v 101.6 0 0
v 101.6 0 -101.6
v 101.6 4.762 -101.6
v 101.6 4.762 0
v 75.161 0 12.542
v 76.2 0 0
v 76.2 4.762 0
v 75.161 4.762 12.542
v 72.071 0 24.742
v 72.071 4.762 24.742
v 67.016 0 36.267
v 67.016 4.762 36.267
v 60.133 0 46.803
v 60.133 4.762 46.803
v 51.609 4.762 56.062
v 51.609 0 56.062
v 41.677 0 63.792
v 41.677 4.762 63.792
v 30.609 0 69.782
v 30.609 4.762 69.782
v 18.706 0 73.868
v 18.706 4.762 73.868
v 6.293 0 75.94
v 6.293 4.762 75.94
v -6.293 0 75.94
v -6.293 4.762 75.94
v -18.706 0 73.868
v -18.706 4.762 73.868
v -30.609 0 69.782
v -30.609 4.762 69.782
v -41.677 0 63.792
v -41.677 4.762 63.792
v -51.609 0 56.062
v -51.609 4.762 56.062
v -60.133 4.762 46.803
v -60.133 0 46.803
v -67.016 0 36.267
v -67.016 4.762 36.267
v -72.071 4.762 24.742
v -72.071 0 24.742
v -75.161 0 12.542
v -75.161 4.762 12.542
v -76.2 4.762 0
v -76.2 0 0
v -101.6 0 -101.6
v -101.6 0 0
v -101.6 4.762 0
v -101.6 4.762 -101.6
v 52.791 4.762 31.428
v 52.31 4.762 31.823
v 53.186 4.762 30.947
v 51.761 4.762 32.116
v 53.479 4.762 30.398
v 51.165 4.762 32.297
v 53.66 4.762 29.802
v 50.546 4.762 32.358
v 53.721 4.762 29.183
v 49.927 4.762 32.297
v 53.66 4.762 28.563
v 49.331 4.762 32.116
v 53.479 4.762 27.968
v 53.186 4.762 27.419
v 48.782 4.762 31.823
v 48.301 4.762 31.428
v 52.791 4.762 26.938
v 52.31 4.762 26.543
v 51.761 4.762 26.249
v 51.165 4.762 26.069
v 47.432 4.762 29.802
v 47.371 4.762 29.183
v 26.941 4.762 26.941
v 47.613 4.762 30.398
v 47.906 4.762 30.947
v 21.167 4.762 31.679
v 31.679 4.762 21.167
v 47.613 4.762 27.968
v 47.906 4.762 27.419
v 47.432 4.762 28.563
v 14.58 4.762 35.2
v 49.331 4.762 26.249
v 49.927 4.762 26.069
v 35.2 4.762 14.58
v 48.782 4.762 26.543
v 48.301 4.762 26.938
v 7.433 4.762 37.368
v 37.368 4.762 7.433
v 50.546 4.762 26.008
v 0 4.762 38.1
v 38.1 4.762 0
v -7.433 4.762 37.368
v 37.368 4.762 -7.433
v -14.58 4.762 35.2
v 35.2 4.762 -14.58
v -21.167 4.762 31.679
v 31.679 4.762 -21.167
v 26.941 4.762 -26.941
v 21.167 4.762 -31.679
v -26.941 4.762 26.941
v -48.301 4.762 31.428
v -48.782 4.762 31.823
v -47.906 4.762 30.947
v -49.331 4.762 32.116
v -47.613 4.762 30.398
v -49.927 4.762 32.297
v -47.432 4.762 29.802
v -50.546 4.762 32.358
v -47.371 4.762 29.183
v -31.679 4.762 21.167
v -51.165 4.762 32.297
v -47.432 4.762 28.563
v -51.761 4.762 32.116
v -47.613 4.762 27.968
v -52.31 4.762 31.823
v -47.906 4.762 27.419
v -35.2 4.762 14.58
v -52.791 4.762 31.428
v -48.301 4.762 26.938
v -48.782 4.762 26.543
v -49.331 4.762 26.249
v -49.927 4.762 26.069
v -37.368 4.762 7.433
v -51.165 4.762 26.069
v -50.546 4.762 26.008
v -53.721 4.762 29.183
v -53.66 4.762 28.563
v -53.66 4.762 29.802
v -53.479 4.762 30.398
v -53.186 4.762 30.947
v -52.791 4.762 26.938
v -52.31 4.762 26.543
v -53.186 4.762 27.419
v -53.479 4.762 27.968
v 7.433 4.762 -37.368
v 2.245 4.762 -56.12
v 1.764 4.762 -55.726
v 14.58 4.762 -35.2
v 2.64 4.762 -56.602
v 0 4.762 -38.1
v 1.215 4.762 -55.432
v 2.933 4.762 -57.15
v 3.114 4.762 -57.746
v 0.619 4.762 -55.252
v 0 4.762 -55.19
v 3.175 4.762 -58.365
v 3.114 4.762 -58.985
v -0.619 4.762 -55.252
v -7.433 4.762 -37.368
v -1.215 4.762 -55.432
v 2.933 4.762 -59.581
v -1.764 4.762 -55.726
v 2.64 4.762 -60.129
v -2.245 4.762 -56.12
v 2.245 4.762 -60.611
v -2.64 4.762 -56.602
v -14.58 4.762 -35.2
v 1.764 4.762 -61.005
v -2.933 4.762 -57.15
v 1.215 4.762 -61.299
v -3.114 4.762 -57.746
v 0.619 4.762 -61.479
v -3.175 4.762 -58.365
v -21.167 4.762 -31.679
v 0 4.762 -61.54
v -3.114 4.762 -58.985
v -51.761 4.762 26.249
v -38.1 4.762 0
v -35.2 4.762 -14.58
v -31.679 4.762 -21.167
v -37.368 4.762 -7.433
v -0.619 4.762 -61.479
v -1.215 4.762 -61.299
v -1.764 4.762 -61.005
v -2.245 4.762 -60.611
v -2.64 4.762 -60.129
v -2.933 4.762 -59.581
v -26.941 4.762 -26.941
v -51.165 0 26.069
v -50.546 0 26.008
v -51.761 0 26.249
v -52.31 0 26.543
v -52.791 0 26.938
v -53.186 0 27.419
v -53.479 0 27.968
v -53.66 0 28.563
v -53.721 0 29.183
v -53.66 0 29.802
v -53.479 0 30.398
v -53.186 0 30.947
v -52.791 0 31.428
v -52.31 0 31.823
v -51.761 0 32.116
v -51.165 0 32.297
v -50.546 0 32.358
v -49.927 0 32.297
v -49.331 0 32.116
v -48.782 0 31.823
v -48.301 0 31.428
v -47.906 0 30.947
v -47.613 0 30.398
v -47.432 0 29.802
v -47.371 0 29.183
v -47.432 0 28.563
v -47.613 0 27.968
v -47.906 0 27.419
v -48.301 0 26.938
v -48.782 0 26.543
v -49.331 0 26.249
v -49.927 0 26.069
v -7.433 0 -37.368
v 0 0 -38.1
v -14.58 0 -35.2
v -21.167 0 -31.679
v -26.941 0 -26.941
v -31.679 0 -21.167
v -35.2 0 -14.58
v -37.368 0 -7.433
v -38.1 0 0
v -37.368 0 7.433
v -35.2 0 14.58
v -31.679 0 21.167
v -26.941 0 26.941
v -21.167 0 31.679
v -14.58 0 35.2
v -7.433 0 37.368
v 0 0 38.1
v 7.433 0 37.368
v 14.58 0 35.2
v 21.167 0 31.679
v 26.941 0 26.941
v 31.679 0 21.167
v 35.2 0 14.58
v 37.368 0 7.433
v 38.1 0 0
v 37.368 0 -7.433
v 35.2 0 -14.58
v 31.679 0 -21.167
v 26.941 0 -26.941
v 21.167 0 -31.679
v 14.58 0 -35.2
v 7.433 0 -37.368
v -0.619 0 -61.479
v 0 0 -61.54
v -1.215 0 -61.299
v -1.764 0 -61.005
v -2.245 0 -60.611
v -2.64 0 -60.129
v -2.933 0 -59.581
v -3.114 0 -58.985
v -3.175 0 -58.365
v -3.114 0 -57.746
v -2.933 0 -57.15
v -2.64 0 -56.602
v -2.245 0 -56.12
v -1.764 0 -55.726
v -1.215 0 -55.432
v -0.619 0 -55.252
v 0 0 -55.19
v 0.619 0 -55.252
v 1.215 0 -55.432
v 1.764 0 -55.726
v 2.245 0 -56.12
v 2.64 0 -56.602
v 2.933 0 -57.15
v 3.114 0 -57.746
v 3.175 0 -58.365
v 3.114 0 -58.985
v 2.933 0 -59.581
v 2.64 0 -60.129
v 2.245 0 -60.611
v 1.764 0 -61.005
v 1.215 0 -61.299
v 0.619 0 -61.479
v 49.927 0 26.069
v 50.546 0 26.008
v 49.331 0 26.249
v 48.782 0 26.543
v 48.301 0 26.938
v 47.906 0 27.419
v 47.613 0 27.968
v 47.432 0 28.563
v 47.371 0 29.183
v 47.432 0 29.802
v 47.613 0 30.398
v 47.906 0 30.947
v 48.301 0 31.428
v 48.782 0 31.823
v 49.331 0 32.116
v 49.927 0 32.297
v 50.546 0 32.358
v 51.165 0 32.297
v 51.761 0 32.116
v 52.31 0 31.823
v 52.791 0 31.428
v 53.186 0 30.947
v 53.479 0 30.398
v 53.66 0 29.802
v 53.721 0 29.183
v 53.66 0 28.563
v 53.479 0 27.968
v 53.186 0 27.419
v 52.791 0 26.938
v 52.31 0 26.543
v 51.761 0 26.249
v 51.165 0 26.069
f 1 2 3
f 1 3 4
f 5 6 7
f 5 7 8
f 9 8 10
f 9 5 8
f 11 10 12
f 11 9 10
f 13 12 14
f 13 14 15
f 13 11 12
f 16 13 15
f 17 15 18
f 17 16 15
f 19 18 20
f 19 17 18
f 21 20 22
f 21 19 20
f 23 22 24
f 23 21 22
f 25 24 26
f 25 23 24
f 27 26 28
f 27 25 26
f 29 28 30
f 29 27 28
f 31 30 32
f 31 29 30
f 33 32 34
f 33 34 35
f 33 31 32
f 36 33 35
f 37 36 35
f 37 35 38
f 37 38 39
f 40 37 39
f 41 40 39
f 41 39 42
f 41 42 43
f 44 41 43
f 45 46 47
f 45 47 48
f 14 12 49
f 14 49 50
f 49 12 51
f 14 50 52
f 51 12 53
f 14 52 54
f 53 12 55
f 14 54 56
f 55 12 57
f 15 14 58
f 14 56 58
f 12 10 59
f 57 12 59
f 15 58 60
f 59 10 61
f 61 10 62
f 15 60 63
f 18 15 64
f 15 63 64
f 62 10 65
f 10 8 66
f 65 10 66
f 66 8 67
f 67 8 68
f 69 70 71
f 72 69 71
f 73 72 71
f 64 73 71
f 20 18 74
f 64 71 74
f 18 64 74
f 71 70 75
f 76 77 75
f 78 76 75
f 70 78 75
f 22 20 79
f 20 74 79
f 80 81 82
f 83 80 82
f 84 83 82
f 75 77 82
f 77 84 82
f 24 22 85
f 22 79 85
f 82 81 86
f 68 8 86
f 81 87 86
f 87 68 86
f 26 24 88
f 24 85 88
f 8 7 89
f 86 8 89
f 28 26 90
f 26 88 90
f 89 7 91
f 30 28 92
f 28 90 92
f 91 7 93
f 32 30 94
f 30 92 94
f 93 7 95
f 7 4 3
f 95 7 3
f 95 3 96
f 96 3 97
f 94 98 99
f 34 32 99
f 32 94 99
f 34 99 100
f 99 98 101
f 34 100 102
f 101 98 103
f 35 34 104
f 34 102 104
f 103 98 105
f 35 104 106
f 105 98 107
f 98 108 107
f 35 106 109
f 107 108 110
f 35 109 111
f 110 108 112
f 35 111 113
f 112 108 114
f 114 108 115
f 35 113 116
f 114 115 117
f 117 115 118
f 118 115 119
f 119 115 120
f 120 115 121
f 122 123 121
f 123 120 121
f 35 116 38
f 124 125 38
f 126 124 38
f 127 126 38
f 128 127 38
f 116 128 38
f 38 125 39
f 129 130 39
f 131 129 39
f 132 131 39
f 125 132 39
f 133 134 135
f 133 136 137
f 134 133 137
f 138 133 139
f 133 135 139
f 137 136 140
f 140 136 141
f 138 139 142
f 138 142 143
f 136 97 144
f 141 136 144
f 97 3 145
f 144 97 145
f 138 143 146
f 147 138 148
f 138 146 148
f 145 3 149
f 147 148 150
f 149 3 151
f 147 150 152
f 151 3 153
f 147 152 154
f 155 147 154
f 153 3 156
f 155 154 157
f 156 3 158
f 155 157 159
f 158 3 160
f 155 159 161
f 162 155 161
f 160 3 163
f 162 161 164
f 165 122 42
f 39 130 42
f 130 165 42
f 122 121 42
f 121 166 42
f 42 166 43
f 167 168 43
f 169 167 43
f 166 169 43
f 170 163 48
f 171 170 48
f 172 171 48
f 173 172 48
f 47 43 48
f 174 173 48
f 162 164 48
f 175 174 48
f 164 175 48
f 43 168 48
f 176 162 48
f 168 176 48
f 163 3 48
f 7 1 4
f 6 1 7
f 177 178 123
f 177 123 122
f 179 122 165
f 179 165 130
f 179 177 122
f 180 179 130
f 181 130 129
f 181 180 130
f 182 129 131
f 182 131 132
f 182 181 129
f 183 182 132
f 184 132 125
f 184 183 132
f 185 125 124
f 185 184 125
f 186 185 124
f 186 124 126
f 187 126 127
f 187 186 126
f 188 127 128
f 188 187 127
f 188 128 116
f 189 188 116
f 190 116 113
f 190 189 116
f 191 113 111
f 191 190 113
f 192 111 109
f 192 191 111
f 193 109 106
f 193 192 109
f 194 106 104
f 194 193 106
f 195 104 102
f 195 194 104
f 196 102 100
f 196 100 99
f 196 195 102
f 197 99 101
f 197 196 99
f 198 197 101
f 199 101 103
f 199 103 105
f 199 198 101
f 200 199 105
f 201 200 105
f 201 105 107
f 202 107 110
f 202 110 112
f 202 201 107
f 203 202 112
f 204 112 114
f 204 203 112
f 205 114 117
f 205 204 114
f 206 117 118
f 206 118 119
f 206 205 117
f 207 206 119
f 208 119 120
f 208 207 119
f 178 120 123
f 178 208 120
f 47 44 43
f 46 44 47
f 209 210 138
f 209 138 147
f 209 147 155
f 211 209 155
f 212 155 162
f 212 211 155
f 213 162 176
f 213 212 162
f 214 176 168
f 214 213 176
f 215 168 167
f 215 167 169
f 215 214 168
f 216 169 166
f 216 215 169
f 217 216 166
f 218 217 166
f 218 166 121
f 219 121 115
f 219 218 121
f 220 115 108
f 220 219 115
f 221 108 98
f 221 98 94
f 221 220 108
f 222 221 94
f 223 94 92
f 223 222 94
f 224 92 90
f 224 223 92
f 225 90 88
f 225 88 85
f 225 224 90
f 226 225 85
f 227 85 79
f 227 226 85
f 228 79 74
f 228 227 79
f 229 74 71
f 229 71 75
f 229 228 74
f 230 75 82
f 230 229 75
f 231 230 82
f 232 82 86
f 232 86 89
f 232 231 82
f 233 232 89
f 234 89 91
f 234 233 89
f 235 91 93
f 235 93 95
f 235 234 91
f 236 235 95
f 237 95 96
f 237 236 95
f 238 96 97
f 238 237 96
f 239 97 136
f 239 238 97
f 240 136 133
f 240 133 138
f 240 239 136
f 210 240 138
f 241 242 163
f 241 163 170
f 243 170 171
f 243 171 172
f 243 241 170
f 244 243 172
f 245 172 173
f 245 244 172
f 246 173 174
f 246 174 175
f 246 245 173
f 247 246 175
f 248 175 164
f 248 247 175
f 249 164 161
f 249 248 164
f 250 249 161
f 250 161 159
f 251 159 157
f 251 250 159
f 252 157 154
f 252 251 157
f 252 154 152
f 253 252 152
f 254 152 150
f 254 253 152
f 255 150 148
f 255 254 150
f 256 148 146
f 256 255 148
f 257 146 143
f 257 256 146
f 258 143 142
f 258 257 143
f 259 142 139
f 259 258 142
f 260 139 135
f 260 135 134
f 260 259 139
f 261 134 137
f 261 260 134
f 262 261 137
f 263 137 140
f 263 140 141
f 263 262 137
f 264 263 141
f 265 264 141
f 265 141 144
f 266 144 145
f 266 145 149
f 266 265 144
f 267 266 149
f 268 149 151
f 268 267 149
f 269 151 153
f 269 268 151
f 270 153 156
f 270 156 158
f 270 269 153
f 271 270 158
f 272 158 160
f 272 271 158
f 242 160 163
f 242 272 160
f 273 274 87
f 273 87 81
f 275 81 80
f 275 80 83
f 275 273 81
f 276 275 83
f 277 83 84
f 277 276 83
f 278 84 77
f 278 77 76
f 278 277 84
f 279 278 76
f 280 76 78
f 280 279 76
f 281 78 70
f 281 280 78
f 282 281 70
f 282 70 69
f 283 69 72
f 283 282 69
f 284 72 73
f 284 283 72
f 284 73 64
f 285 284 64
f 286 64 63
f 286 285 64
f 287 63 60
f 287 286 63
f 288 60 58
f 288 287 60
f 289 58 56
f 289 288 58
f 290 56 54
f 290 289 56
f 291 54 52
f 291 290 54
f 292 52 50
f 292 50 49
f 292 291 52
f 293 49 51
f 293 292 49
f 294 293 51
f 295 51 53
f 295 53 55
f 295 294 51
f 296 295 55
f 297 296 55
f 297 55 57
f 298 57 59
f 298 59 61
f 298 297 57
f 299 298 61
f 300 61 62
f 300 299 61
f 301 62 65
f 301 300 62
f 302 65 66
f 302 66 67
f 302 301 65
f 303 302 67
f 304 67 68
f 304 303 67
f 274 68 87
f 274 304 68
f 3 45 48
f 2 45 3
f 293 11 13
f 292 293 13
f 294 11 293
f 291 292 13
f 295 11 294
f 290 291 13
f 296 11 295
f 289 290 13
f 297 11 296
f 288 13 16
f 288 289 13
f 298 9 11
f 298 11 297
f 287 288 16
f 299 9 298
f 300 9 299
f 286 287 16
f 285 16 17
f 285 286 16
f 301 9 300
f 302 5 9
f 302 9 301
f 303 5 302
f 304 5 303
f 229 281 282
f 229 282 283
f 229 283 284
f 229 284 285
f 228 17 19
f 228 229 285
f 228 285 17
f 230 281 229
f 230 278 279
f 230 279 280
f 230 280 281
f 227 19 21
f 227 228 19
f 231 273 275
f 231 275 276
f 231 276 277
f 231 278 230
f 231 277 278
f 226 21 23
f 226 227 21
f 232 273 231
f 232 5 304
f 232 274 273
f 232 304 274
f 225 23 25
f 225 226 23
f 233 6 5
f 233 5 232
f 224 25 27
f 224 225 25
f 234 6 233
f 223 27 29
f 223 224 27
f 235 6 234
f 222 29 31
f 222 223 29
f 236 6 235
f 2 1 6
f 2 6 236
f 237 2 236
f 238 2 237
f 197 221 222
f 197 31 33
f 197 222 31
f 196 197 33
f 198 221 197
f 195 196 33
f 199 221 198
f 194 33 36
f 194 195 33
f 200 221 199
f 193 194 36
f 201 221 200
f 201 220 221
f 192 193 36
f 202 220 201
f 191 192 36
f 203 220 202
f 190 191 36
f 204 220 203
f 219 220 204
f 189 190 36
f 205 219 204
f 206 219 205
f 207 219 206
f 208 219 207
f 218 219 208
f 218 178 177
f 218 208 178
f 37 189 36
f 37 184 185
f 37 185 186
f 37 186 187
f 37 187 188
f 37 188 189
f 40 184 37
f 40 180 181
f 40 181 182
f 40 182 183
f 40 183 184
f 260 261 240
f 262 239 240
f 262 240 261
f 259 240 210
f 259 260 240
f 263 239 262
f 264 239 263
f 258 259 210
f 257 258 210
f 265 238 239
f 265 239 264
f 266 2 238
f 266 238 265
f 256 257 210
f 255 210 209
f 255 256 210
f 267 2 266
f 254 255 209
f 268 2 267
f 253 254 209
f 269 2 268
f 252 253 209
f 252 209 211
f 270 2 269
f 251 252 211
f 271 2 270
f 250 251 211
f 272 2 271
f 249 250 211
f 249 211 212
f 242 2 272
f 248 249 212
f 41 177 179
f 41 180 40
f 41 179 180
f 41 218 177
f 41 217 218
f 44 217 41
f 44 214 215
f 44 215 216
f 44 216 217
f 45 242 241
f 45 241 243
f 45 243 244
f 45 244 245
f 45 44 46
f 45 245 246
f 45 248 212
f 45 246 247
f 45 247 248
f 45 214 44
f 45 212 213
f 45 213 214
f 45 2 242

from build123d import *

# Parameters (mm, degrees)
SKETCH1_R           = 3.175
SKETCH1_R_2         = 38.1
BOSS_EXTRUDE1_DEPTH = 4.7625


with BuildPart() as part:
    # Sketch1 → Boss-Extrude1 (new body)
    with BuildSketch(Plane(origin=(0, 0, 0), x_dir=(1, 0, 0), z_dir=(0, 1, 0))):
        with BuildLine():
            Line((-101.6, 0), (-101.6, 101.6))
            Line((-101.6, 101.6), (101.6, 101.6))
            Line((101.6, 101.6), (101.6, 0))
            Line((101.6, 0), (76.2, 0))
            ThreePointArc((76.2, 0), (0, -76.2), (-76.2, 0))
            Line((-76.2, 0), (-101.6, 0))
        make_face()
        with Locations(Location((0, 58.365493413, 0), (0, 0, 90))):
            Circle(SKETCH1_R, mode=Mode.SUBTRACT)
        with Locations(Location((-50.546, -29.182746706, 0), (0, 0, 90))):
            Circle(SKETCH1_R, mode=Mode.SUBTRACT)
        with Locations(Location((50.546, -29.182746706, 0), (0, 0, 90))):
            Circle(SKETCH1_R, mode=Mode.SUBTRACT)
        with Locations(Location((0, 0, 0), (0, 0, 90))):
            Circle(SKETCH1_R_2, mode=Mode.SUBTRACT)
    extrude(amount=BOSS_EXTRUDE1_DEPTH)


solid = part.part
